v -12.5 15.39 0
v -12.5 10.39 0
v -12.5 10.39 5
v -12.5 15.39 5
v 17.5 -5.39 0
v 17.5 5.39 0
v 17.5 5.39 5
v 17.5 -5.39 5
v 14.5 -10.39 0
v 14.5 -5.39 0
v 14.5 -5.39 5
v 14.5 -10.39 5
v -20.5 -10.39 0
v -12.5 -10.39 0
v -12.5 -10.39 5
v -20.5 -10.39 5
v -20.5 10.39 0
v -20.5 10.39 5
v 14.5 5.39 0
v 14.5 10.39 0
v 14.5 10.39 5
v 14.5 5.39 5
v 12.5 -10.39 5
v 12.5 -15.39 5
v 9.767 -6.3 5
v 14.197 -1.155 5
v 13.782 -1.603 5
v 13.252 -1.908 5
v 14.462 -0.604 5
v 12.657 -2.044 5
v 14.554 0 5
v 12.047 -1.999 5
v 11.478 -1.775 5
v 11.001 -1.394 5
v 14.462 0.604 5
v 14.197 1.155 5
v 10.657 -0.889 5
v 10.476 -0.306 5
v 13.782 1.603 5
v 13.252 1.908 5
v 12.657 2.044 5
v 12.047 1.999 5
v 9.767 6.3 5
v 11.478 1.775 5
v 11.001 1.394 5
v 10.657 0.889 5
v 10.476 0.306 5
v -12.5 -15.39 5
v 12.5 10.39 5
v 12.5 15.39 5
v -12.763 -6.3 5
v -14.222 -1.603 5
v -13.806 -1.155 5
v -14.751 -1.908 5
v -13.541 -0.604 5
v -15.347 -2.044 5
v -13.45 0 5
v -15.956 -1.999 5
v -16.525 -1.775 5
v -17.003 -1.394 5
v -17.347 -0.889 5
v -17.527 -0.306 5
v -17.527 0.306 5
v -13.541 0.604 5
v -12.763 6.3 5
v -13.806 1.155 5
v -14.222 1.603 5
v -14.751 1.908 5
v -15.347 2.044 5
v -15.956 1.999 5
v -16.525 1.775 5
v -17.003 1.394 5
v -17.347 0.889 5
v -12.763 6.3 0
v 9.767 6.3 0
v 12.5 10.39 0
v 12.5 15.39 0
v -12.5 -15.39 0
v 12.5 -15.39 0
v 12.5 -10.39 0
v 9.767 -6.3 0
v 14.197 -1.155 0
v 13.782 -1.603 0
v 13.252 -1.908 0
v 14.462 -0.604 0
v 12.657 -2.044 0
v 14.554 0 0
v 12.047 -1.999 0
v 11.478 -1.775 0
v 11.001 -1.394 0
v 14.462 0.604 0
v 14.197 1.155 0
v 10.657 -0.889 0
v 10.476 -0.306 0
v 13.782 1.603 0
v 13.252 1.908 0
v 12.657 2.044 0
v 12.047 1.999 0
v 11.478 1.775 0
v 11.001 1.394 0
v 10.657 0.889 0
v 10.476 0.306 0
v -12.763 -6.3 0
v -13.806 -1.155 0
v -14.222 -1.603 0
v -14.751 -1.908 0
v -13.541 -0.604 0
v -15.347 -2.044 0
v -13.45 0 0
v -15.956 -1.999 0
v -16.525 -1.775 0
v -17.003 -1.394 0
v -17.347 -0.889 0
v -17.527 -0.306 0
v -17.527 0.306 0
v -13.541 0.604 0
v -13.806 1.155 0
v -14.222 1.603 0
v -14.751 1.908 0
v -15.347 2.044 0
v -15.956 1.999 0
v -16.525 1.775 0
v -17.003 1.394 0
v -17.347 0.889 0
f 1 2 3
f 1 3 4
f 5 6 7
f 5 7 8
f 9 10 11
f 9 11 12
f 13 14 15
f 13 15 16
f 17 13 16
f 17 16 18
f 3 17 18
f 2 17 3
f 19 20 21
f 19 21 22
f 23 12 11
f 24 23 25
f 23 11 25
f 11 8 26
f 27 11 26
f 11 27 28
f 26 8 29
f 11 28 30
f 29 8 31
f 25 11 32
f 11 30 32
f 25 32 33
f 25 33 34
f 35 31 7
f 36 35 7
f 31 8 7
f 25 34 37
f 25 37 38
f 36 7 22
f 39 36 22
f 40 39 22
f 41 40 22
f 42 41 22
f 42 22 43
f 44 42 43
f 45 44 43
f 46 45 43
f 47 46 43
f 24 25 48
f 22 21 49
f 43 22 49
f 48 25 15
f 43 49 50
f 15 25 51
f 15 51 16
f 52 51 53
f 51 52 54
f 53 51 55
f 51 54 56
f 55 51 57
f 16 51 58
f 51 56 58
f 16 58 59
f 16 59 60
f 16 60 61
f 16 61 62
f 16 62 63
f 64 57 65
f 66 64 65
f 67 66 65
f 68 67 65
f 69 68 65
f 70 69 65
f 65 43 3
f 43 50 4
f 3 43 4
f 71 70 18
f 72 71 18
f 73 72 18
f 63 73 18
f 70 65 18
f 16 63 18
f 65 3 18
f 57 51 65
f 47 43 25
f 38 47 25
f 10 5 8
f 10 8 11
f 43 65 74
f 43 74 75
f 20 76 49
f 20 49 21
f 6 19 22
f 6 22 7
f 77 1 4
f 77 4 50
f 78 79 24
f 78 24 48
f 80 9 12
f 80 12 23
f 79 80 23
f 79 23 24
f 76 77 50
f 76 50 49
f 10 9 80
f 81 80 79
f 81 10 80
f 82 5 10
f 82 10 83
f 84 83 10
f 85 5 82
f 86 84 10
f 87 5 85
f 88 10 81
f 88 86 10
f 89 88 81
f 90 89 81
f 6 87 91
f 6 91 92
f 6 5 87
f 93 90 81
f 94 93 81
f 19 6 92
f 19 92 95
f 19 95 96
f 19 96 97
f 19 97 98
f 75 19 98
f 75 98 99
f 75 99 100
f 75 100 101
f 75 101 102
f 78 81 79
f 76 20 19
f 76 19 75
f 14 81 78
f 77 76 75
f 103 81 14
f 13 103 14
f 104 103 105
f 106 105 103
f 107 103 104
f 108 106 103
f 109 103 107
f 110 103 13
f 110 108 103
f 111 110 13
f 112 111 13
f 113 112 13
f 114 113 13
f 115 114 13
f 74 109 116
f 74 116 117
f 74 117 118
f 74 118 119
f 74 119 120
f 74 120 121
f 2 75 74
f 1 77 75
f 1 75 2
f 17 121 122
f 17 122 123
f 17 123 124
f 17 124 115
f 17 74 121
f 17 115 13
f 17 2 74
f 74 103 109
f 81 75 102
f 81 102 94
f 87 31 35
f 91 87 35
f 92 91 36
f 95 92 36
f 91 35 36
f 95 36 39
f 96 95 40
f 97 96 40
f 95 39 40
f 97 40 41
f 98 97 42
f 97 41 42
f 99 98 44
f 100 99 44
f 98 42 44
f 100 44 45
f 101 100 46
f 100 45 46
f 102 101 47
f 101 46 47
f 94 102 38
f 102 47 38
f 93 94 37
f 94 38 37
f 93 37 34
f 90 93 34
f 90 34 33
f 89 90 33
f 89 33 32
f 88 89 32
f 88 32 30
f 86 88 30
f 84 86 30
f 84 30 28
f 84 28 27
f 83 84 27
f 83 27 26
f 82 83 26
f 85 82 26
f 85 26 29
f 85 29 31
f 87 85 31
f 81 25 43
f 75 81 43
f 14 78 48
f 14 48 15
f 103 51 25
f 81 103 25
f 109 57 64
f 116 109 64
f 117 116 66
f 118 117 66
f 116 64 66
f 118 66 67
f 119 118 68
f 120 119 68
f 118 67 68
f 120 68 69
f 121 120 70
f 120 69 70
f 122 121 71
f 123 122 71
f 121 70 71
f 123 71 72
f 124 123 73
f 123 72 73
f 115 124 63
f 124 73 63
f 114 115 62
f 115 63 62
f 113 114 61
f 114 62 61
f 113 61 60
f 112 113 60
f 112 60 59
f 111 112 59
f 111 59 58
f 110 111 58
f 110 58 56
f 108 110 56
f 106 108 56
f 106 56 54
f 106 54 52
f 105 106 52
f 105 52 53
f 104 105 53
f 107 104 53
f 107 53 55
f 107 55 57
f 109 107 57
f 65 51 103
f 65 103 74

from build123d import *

# Parameters (mm, degrees)
SALIENTE_EXTRUIR1_DEPTH = 5
CUT_EXTRUDE1_REACH      = 7
CROQUIS2_R              = 2.05
CROQUIS2_W              = 22.53
CROQUIS2_H              = 12.6


with BuildPart() as part:
    # Croquis1 → Saliente-Extruir1 (new body)
    with BuildSketch(Plane.XY):
        Polygon((-12.5, 15.39), (12.5, 15.39), (12.5, 10.39), (14.5, 10.39), (14.5, 5.39), (17.5, 5.39), (17.5, -5.39), (14.5, -5.39), (14.5, -10.39), (12.5, -10.39), (12.5, -15.39), (-12.5, -15.39), (-12.5, -10.39), (-20.5, -10.39), (-20.5, 10.39), (-12.5, 10.39), align=None)
    extrude(amount=SALIENTE_EXTRUIR1_DEPTH)

    # Croquis2 → Cut-Extrude1 (cut, up to next)
    with BuildSketch(Plane.XY.offset(5), mode=Mode.PRIVATE) as cut_extrude1_sk1:
        with Locations((-15.5, 0)):
            Circle(CROQUIS2_R)
    cut_extrude1_tool1 = extrude(cut_extrude1_sk1.sketch, amount=-CUT_EXTRUDE1_REACH, mode=Mode.PRIVATE) & part.part
    add(cut_extrude1_tool1.solids().sort_by_distance((-15.5, 0, 5))[0], mode=Mode.SUBTRACT)
    # Croquis2 → Cut-Extrude1 (cut, up to next)
    with BuildSketch(Plane.XY.offset(5), mode=Mode.PRIVATE) as cut_extrude1_sk2:
        with Locations((12.5035, 0)):
            Circle(CROQUIS2_R)
    cut_extrude1_tool2 = extrude(cut_extrude1_sk2.sketch, amount=-CUT_EXTRUDE1_REACH, mode=Mode.PRIVATE) & part.part
    add(cut_extrude1_tool2.solids().sort_by_distance((12.5035, 0, 5))[0], mode=Mode.SUBTRACT)
    # Croquis2 → Cut-Extrude1 (cut, up to next)
    with BuildSketch(Plane.XY.offset(5), mode=Mode.PRIVATE) as cut_extrude1_sk3:
        with Locations((-1.49835, 0)):
            Rectangle(CROQUIS2_W, CROQUIS2_H)
    cut_extrude1_tool3 = extrude(cut_extrude1_sk3.sketch, amount=-CUT_EXTRUDE1_REACH, mode=Mode.PRIVATE) & part.part
    add(cut_extrude1_tool3.solids().sort_by_distance((-1.49835, 0, 5))[0], mode=Mode.SUBTRACT)


solid = part.part
